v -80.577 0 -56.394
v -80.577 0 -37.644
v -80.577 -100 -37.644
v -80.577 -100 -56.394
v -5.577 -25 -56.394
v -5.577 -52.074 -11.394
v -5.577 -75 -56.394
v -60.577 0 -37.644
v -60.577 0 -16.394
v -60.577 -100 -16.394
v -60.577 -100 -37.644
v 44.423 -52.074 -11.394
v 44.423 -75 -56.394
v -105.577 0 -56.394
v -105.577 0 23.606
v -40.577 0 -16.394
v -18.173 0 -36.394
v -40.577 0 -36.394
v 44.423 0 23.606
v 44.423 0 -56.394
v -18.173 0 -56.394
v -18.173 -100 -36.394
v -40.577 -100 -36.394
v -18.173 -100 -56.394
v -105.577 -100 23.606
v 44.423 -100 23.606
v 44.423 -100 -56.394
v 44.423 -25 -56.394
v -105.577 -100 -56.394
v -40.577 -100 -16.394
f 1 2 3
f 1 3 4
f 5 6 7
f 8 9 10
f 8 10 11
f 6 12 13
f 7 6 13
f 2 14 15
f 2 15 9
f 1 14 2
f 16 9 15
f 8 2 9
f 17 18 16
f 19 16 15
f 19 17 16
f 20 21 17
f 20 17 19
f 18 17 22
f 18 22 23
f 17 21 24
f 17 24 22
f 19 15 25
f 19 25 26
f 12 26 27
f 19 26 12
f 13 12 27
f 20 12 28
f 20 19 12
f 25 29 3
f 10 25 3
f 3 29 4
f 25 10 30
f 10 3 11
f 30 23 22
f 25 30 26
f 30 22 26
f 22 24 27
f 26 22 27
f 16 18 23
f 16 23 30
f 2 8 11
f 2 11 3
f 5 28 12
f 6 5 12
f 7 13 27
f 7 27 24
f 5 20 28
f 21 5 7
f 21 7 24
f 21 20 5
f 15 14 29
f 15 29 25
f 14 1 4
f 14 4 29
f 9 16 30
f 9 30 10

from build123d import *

# Parameters (mm, degrees)
BOSS_EXTRUDE1_DEPTH = 100
CUT_EXTRUDE1_DEPTH  = 50


with BuildPart() as part:
    # Sketch1 → Boss-Extrude1 (new body)
    with BuildSketch(Plane(origin=(0, 0, 0), x_dir=(1, 0, 0), z_dir=(0, 1, 0))):
        Polygon((-105.576923077, -23.605769231), (44.423076923, -23.605769231), (44.423076923, 56.394230769), (-18.173076923, 56.394230769), (-18.173076923, 36.394230769), (-40.576923077, 36.394230769), (-40.576923077, 16.394230769), (-60.576923077, 16.394230769), (-60.576923077, 37.644230769), (-80.576923077, 37.644230769), (-80.576923077, 56.394230769), (-105.576923077, 56.394230769), align=None)
    extrude(amount=-BOSS_EXTRUDE1_DEPTH)

    # Sketch3 → Cut-Extrude1 (cut)
    with BuildSketch(Plane(origin=(44.423076923, 0, 0), x_dir=(0, 0, -1), z_dir=(1, 0, 0))):
        Polygon((56.394230769, -25), (11.394230769, -52.073671681), (56.394230769, -75), align=None)
    extrude(amount=-CUT_EXTRUDE1_DEPTH, mode=Mode.SUBTRACT)


solid = part.part
